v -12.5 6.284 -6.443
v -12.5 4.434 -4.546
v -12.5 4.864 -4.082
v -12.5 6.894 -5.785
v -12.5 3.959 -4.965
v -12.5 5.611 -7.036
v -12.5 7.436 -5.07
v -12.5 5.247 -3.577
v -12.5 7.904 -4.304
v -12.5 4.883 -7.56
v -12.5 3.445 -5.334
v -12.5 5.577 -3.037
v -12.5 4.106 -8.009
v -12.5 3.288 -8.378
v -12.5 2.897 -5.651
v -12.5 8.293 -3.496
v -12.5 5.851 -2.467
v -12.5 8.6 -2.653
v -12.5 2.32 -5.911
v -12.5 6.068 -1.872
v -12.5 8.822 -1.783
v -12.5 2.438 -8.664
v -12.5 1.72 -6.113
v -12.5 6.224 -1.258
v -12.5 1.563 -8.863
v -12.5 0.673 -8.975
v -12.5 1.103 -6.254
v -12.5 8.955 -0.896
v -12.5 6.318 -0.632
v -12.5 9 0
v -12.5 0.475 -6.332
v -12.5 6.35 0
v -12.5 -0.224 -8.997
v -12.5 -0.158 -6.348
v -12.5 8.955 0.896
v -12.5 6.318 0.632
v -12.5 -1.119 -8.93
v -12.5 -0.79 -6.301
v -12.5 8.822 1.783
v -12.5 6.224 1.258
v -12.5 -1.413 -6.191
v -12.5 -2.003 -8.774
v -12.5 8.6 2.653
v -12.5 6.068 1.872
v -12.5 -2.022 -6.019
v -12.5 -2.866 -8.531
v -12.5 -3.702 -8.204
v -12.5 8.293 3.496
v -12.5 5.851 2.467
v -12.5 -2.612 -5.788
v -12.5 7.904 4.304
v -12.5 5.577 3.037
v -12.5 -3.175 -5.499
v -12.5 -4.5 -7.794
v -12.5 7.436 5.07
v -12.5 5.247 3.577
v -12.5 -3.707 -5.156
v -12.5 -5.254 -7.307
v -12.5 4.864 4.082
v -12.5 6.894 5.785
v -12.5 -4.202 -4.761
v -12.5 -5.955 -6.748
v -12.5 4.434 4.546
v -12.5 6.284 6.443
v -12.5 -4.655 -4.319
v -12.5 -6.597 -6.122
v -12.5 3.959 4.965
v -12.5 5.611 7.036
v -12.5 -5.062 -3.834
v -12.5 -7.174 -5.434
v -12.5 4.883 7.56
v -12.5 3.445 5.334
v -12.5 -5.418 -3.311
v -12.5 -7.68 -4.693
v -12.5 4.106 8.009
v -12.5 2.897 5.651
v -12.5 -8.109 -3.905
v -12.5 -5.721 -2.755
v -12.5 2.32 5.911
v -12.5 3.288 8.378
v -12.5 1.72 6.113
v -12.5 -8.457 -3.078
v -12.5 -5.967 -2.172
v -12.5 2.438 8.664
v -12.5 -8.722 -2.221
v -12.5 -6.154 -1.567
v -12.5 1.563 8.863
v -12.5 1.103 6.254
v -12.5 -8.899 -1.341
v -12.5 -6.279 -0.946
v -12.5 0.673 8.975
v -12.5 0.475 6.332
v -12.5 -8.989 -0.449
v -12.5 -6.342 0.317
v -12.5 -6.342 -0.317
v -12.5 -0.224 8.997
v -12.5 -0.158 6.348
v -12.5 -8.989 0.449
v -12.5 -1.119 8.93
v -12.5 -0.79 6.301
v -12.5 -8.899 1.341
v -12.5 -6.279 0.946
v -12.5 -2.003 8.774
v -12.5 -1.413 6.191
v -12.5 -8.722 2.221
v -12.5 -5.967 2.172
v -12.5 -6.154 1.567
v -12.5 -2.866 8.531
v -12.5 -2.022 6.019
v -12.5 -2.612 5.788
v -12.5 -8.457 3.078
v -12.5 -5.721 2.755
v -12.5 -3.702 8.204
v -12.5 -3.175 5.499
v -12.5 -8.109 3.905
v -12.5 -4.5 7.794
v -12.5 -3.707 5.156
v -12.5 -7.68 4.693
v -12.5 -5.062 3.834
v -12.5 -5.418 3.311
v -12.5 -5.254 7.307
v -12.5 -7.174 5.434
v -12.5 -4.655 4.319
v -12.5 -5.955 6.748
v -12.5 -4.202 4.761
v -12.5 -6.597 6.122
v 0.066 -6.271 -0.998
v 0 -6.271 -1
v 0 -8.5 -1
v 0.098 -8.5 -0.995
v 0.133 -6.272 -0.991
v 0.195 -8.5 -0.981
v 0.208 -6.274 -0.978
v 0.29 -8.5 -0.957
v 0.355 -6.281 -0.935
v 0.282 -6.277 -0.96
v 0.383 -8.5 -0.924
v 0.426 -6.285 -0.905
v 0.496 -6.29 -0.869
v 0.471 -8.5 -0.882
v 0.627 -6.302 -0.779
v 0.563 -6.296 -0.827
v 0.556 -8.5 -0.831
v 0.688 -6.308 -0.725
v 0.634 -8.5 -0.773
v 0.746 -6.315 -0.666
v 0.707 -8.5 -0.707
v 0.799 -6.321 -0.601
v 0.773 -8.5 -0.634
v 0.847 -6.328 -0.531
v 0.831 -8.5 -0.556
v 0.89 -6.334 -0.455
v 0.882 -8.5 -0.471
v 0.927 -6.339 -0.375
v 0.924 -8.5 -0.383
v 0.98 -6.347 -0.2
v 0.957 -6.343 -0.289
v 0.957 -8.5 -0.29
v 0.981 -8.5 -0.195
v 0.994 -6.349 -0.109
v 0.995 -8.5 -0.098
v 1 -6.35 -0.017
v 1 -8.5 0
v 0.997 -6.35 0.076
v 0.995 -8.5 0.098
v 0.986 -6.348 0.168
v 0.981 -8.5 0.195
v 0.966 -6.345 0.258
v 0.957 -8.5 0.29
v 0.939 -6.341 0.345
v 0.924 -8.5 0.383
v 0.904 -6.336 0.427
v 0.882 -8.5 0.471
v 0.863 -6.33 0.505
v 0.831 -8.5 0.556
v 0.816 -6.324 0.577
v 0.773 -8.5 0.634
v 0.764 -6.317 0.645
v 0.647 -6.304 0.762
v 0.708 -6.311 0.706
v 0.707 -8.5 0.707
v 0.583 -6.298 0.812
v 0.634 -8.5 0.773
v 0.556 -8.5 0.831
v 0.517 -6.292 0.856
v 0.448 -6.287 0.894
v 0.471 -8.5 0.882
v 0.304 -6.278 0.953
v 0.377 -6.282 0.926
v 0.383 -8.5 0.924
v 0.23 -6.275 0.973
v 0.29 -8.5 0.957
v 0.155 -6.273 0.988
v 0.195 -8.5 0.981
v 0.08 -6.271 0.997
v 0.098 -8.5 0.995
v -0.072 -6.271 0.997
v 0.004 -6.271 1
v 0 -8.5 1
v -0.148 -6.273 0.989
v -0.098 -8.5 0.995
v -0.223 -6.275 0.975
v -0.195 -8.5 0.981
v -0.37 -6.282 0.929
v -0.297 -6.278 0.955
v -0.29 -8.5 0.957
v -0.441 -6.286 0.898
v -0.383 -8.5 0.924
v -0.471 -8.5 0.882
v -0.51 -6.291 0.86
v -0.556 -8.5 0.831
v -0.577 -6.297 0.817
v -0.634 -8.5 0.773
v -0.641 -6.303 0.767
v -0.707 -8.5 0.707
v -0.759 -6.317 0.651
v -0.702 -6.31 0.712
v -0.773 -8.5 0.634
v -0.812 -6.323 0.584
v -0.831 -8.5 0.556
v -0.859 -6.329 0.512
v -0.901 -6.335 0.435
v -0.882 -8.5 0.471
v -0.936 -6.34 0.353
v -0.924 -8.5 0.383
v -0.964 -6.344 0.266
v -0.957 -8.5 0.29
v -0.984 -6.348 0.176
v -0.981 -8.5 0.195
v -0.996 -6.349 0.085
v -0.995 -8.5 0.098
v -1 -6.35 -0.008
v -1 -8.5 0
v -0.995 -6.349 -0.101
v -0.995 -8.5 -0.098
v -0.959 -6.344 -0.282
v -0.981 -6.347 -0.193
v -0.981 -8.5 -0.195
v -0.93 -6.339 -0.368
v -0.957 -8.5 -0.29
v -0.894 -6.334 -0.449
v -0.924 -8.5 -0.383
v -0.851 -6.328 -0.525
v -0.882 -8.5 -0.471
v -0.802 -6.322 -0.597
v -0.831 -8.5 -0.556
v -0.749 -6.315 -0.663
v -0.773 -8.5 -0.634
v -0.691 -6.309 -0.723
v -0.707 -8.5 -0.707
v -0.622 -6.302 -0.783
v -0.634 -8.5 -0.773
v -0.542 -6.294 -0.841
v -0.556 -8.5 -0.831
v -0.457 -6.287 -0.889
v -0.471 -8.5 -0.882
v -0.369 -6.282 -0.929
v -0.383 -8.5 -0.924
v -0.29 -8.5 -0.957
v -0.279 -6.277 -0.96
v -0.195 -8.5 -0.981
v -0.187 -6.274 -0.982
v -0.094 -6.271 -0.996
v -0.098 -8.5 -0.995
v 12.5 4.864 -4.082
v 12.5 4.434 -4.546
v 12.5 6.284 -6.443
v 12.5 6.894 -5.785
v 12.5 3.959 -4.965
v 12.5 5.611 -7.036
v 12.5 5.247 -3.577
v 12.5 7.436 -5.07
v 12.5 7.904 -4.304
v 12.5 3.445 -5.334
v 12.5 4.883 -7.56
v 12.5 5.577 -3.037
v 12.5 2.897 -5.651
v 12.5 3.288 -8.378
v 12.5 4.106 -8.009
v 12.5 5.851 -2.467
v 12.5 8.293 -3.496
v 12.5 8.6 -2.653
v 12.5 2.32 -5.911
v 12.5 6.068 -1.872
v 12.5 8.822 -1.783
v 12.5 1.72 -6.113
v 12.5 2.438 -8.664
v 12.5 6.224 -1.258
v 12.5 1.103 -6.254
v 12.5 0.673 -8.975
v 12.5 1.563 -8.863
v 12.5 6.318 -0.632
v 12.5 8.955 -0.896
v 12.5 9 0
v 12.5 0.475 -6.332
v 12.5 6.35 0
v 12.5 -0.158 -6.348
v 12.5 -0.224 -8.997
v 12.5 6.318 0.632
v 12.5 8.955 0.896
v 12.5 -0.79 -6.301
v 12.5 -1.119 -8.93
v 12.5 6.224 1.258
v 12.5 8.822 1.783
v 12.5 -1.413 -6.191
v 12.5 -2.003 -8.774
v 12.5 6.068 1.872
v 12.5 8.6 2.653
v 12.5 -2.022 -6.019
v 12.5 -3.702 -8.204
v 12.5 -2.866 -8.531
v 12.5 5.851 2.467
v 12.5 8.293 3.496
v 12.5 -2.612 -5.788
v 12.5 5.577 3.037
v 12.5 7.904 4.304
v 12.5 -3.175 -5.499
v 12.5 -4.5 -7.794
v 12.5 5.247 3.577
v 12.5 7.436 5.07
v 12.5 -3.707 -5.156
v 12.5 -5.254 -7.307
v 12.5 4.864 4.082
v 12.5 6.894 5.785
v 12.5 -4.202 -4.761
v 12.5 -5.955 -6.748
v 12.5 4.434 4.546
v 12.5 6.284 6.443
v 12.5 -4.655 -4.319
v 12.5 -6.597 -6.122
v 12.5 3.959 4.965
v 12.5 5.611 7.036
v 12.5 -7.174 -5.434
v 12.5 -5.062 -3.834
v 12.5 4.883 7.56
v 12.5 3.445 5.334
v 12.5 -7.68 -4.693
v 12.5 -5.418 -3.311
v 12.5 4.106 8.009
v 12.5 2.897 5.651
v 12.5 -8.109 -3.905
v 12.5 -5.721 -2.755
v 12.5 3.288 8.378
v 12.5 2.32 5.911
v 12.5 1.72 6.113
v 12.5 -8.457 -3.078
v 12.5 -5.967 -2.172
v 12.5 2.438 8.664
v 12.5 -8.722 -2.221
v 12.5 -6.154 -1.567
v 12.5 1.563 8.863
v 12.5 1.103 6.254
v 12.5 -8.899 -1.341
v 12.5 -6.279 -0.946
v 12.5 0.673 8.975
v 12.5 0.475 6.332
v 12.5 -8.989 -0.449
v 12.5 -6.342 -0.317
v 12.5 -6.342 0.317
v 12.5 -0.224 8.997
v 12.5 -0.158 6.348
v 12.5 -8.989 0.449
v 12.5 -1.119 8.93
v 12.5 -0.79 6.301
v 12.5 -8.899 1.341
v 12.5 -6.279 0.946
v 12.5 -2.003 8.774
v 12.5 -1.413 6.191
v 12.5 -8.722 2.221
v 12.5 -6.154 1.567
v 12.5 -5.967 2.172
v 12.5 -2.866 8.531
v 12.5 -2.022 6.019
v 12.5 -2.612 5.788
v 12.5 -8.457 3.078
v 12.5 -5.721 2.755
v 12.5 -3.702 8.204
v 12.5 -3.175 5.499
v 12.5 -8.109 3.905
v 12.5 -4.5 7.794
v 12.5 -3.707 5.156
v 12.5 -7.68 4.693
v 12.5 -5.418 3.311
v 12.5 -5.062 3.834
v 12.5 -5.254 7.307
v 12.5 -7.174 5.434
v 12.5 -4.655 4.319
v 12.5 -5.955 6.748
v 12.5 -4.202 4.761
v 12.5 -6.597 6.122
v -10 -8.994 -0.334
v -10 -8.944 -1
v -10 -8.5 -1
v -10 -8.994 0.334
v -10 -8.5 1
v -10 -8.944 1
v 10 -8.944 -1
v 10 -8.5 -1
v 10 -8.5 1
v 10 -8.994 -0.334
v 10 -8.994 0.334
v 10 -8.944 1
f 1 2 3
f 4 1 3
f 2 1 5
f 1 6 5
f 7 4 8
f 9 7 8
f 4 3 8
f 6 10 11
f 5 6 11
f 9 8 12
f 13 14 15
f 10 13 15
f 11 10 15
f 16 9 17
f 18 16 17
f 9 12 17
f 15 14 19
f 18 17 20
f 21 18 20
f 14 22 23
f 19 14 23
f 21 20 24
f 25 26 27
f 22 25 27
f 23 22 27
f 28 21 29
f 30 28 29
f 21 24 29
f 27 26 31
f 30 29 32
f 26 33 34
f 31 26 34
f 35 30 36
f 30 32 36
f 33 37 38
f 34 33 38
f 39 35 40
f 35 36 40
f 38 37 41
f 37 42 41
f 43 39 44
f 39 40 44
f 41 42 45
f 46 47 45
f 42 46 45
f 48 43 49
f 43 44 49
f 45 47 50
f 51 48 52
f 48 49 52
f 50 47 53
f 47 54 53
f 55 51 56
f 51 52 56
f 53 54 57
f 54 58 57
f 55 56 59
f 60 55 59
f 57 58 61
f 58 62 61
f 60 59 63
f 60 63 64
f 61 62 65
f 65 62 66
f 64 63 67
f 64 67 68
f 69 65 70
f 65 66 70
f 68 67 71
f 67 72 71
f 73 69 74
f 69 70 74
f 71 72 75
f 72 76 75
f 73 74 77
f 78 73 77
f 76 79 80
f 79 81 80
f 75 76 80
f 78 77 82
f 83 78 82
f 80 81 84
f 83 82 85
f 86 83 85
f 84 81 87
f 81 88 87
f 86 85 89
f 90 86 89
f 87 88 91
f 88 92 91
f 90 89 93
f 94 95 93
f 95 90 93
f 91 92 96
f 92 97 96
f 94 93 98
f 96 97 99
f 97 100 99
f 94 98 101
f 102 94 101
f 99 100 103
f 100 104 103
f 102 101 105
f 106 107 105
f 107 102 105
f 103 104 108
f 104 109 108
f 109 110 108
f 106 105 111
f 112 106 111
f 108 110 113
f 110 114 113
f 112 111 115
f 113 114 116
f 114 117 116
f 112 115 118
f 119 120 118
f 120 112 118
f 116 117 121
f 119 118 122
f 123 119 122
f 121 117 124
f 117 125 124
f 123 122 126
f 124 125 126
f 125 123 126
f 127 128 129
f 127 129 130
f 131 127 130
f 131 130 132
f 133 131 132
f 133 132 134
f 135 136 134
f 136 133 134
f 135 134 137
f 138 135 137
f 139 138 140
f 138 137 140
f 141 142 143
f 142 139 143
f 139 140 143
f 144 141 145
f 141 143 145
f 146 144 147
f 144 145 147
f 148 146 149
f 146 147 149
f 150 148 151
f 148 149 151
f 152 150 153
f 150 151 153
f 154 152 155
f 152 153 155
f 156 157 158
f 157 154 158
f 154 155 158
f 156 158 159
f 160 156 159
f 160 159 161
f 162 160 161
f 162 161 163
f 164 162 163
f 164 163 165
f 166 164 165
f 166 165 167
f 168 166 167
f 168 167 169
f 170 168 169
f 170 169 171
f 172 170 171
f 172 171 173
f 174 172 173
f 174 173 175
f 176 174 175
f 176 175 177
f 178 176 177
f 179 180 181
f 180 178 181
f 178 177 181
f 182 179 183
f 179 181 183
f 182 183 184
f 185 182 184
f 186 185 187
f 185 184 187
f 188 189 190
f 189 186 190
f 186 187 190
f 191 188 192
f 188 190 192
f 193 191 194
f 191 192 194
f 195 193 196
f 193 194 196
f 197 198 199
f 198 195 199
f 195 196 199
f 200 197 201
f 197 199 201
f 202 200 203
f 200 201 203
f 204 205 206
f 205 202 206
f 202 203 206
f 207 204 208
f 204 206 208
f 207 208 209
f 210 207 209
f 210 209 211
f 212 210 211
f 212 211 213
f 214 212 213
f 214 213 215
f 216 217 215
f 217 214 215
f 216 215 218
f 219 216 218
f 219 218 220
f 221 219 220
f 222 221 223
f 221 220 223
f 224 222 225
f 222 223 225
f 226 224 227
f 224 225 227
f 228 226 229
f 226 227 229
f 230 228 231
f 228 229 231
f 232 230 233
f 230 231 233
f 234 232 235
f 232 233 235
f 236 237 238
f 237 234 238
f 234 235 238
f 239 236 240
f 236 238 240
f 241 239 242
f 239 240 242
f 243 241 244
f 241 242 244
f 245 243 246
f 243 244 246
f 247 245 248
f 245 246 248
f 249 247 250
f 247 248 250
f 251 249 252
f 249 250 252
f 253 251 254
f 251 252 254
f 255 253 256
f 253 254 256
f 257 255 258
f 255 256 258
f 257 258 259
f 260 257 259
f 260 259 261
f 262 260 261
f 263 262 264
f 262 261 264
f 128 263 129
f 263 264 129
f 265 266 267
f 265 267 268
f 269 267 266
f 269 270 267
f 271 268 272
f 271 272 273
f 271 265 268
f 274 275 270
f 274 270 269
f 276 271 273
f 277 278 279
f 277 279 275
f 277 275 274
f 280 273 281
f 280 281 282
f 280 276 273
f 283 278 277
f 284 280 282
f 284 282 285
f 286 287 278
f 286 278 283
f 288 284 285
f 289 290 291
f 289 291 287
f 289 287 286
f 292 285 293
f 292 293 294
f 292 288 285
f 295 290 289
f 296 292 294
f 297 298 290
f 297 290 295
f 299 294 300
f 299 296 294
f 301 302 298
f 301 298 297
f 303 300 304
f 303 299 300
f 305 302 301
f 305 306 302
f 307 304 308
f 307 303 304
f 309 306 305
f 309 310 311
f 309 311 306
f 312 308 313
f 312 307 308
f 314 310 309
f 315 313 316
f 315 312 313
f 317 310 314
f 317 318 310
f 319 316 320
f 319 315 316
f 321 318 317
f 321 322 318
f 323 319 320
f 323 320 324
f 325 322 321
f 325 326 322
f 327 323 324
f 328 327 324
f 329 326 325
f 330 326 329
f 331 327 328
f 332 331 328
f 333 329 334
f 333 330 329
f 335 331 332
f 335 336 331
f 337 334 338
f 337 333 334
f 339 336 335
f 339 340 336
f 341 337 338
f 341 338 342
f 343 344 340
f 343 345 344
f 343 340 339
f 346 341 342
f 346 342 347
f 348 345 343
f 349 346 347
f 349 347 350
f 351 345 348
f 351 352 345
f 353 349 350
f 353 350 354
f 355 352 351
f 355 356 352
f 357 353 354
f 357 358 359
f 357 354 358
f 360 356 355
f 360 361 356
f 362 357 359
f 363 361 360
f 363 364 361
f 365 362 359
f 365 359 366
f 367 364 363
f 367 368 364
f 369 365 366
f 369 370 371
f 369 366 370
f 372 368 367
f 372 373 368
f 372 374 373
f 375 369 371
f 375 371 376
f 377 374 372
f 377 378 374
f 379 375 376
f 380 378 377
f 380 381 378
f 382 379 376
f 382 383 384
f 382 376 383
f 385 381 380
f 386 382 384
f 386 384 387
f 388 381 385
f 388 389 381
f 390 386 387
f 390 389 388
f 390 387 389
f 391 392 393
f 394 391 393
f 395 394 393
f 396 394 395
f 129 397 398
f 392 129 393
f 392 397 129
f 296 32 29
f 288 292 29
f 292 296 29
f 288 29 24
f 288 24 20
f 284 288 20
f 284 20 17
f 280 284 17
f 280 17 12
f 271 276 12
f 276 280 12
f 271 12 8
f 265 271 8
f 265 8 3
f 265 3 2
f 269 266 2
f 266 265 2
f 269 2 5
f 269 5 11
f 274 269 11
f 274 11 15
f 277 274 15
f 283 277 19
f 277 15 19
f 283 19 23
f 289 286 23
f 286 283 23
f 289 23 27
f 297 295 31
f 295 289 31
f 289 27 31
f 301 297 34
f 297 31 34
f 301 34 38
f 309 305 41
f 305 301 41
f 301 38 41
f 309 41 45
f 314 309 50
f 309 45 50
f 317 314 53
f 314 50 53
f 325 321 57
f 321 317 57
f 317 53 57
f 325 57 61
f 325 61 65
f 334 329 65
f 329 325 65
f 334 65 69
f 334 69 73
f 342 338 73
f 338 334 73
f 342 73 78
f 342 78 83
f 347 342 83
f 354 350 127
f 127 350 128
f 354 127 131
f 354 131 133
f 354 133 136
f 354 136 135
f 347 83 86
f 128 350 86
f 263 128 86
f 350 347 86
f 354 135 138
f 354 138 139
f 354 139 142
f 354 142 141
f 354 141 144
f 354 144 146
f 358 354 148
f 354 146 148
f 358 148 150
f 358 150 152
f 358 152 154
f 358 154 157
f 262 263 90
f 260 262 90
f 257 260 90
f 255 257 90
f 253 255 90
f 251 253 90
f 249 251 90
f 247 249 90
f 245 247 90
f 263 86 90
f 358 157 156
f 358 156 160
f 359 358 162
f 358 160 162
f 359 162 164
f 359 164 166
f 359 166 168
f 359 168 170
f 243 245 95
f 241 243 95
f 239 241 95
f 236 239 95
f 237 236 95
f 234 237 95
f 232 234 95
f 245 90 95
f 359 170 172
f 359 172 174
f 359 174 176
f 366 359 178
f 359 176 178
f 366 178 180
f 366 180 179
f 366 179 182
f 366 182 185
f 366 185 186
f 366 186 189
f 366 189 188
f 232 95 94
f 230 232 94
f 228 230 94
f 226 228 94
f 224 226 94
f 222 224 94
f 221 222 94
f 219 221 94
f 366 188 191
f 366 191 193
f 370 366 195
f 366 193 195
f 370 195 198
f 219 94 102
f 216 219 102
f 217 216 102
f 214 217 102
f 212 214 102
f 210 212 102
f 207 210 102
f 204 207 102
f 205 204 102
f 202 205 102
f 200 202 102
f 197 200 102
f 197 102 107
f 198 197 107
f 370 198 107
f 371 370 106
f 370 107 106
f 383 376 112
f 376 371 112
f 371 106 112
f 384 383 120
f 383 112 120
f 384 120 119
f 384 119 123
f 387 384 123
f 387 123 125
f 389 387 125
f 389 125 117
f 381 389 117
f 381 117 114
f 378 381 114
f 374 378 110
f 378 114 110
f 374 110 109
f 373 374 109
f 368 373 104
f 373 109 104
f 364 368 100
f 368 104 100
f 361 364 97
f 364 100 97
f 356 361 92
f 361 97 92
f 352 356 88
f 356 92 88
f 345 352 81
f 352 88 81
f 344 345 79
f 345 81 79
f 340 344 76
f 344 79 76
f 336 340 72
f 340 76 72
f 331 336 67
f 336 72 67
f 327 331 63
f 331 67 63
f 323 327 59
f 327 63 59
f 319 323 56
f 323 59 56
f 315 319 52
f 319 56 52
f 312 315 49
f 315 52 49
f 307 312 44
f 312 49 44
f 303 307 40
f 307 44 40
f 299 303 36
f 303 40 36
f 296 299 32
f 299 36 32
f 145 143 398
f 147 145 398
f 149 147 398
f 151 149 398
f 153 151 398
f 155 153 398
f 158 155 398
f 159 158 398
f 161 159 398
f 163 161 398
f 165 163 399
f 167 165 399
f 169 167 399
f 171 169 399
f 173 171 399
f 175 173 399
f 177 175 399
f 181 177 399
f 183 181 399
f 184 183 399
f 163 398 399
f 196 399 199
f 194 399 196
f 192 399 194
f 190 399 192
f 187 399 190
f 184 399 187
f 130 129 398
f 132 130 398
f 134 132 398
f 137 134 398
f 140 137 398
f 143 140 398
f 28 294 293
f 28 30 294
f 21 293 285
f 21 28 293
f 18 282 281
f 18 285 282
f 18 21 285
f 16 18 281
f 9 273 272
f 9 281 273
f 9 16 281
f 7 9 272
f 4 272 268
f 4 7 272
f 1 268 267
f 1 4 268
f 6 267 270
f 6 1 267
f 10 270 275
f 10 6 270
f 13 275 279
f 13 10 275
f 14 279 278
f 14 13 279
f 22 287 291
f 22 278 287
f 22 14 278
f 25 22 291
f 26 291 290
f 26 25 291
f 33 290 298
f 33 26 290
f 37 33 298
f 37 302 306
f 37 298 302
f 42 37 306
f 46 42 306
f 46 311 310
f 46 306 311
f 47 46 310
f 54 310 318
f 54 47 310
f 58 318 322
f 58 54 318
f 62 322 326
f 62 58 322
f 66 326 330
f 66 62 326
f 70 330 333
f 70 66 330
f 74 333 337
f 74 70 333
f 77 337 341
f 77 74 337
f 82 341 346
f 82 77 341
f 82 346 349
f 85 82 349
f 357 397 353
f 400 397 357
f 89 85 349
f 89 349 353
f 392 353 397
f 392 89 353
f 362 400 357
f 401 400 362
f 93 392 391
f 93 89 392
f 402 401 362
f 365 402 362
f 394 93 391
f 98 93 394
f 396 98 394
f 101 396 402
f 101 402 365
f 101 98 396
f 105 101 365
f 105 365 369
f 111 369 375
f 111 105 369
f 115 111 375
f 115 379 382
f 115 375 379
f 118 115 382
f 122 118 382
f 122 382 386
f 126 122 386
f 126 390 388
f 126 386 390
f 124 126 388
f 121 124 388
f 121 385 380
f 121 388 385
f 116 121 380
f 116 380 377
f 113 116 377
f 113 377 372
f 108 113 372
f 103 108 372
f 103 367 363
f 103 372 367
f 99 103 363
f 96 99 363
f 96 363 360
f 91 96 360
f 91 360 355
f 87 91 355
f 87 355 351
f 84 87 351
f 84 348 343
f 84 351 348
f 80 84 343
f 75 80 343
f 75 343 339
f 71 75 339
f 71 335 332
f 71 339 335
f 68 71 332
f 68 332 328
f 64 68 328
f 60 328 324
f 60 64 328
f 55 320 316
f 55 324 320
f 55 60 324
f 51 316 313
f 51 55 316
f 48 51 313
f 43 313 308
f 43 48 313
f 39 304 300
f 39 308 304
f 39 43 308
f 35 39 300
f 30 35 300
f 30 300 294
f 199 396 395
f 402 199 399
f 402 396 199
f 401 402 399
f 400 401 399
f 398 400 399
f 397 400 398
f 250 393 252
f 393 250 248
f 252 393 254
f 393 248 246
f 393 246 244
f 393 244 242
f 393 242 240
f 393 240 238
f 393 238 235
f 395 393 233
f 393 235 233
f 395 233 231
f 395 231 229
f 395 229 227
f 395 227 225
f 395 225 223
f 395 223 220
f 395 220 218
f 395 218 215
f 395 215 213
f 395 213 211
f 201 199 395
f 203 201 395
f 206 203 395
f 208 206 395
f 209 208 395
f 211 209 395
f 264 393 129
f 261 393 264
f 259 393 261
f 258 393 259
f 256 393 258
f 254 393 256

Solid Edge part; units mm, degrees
sketch "Sketch1" plane through (0, 0, 0) normal (1, 0, 0) x (0, 1, 0)
  circle A0 centre (0, 0) radius 9
  circle A1 centre (0, 0) radius 6.35
extrude "Protrusion1" add sketch "Sketch1" along normal mid plane 25
sketch "Sketch2" plane through (0, -9, 0) normal (0, -1, 0) x (1, 0, 0)
  line L0 (10, -1) -> (-10, -1)
  line L1 (-10, -1) -> (-10, 1)
  line L2 (-10, 1) -> (10, 1)
  line L3 (10, 1) -> (10, -1)
extrude "ExtrudedCutout_1" cut sketch "Sketch2" against normal blind 0.5
hole "Hole_1" at (0, -9, 0) direction (0, 1, 0) diameter 2 end up to next
